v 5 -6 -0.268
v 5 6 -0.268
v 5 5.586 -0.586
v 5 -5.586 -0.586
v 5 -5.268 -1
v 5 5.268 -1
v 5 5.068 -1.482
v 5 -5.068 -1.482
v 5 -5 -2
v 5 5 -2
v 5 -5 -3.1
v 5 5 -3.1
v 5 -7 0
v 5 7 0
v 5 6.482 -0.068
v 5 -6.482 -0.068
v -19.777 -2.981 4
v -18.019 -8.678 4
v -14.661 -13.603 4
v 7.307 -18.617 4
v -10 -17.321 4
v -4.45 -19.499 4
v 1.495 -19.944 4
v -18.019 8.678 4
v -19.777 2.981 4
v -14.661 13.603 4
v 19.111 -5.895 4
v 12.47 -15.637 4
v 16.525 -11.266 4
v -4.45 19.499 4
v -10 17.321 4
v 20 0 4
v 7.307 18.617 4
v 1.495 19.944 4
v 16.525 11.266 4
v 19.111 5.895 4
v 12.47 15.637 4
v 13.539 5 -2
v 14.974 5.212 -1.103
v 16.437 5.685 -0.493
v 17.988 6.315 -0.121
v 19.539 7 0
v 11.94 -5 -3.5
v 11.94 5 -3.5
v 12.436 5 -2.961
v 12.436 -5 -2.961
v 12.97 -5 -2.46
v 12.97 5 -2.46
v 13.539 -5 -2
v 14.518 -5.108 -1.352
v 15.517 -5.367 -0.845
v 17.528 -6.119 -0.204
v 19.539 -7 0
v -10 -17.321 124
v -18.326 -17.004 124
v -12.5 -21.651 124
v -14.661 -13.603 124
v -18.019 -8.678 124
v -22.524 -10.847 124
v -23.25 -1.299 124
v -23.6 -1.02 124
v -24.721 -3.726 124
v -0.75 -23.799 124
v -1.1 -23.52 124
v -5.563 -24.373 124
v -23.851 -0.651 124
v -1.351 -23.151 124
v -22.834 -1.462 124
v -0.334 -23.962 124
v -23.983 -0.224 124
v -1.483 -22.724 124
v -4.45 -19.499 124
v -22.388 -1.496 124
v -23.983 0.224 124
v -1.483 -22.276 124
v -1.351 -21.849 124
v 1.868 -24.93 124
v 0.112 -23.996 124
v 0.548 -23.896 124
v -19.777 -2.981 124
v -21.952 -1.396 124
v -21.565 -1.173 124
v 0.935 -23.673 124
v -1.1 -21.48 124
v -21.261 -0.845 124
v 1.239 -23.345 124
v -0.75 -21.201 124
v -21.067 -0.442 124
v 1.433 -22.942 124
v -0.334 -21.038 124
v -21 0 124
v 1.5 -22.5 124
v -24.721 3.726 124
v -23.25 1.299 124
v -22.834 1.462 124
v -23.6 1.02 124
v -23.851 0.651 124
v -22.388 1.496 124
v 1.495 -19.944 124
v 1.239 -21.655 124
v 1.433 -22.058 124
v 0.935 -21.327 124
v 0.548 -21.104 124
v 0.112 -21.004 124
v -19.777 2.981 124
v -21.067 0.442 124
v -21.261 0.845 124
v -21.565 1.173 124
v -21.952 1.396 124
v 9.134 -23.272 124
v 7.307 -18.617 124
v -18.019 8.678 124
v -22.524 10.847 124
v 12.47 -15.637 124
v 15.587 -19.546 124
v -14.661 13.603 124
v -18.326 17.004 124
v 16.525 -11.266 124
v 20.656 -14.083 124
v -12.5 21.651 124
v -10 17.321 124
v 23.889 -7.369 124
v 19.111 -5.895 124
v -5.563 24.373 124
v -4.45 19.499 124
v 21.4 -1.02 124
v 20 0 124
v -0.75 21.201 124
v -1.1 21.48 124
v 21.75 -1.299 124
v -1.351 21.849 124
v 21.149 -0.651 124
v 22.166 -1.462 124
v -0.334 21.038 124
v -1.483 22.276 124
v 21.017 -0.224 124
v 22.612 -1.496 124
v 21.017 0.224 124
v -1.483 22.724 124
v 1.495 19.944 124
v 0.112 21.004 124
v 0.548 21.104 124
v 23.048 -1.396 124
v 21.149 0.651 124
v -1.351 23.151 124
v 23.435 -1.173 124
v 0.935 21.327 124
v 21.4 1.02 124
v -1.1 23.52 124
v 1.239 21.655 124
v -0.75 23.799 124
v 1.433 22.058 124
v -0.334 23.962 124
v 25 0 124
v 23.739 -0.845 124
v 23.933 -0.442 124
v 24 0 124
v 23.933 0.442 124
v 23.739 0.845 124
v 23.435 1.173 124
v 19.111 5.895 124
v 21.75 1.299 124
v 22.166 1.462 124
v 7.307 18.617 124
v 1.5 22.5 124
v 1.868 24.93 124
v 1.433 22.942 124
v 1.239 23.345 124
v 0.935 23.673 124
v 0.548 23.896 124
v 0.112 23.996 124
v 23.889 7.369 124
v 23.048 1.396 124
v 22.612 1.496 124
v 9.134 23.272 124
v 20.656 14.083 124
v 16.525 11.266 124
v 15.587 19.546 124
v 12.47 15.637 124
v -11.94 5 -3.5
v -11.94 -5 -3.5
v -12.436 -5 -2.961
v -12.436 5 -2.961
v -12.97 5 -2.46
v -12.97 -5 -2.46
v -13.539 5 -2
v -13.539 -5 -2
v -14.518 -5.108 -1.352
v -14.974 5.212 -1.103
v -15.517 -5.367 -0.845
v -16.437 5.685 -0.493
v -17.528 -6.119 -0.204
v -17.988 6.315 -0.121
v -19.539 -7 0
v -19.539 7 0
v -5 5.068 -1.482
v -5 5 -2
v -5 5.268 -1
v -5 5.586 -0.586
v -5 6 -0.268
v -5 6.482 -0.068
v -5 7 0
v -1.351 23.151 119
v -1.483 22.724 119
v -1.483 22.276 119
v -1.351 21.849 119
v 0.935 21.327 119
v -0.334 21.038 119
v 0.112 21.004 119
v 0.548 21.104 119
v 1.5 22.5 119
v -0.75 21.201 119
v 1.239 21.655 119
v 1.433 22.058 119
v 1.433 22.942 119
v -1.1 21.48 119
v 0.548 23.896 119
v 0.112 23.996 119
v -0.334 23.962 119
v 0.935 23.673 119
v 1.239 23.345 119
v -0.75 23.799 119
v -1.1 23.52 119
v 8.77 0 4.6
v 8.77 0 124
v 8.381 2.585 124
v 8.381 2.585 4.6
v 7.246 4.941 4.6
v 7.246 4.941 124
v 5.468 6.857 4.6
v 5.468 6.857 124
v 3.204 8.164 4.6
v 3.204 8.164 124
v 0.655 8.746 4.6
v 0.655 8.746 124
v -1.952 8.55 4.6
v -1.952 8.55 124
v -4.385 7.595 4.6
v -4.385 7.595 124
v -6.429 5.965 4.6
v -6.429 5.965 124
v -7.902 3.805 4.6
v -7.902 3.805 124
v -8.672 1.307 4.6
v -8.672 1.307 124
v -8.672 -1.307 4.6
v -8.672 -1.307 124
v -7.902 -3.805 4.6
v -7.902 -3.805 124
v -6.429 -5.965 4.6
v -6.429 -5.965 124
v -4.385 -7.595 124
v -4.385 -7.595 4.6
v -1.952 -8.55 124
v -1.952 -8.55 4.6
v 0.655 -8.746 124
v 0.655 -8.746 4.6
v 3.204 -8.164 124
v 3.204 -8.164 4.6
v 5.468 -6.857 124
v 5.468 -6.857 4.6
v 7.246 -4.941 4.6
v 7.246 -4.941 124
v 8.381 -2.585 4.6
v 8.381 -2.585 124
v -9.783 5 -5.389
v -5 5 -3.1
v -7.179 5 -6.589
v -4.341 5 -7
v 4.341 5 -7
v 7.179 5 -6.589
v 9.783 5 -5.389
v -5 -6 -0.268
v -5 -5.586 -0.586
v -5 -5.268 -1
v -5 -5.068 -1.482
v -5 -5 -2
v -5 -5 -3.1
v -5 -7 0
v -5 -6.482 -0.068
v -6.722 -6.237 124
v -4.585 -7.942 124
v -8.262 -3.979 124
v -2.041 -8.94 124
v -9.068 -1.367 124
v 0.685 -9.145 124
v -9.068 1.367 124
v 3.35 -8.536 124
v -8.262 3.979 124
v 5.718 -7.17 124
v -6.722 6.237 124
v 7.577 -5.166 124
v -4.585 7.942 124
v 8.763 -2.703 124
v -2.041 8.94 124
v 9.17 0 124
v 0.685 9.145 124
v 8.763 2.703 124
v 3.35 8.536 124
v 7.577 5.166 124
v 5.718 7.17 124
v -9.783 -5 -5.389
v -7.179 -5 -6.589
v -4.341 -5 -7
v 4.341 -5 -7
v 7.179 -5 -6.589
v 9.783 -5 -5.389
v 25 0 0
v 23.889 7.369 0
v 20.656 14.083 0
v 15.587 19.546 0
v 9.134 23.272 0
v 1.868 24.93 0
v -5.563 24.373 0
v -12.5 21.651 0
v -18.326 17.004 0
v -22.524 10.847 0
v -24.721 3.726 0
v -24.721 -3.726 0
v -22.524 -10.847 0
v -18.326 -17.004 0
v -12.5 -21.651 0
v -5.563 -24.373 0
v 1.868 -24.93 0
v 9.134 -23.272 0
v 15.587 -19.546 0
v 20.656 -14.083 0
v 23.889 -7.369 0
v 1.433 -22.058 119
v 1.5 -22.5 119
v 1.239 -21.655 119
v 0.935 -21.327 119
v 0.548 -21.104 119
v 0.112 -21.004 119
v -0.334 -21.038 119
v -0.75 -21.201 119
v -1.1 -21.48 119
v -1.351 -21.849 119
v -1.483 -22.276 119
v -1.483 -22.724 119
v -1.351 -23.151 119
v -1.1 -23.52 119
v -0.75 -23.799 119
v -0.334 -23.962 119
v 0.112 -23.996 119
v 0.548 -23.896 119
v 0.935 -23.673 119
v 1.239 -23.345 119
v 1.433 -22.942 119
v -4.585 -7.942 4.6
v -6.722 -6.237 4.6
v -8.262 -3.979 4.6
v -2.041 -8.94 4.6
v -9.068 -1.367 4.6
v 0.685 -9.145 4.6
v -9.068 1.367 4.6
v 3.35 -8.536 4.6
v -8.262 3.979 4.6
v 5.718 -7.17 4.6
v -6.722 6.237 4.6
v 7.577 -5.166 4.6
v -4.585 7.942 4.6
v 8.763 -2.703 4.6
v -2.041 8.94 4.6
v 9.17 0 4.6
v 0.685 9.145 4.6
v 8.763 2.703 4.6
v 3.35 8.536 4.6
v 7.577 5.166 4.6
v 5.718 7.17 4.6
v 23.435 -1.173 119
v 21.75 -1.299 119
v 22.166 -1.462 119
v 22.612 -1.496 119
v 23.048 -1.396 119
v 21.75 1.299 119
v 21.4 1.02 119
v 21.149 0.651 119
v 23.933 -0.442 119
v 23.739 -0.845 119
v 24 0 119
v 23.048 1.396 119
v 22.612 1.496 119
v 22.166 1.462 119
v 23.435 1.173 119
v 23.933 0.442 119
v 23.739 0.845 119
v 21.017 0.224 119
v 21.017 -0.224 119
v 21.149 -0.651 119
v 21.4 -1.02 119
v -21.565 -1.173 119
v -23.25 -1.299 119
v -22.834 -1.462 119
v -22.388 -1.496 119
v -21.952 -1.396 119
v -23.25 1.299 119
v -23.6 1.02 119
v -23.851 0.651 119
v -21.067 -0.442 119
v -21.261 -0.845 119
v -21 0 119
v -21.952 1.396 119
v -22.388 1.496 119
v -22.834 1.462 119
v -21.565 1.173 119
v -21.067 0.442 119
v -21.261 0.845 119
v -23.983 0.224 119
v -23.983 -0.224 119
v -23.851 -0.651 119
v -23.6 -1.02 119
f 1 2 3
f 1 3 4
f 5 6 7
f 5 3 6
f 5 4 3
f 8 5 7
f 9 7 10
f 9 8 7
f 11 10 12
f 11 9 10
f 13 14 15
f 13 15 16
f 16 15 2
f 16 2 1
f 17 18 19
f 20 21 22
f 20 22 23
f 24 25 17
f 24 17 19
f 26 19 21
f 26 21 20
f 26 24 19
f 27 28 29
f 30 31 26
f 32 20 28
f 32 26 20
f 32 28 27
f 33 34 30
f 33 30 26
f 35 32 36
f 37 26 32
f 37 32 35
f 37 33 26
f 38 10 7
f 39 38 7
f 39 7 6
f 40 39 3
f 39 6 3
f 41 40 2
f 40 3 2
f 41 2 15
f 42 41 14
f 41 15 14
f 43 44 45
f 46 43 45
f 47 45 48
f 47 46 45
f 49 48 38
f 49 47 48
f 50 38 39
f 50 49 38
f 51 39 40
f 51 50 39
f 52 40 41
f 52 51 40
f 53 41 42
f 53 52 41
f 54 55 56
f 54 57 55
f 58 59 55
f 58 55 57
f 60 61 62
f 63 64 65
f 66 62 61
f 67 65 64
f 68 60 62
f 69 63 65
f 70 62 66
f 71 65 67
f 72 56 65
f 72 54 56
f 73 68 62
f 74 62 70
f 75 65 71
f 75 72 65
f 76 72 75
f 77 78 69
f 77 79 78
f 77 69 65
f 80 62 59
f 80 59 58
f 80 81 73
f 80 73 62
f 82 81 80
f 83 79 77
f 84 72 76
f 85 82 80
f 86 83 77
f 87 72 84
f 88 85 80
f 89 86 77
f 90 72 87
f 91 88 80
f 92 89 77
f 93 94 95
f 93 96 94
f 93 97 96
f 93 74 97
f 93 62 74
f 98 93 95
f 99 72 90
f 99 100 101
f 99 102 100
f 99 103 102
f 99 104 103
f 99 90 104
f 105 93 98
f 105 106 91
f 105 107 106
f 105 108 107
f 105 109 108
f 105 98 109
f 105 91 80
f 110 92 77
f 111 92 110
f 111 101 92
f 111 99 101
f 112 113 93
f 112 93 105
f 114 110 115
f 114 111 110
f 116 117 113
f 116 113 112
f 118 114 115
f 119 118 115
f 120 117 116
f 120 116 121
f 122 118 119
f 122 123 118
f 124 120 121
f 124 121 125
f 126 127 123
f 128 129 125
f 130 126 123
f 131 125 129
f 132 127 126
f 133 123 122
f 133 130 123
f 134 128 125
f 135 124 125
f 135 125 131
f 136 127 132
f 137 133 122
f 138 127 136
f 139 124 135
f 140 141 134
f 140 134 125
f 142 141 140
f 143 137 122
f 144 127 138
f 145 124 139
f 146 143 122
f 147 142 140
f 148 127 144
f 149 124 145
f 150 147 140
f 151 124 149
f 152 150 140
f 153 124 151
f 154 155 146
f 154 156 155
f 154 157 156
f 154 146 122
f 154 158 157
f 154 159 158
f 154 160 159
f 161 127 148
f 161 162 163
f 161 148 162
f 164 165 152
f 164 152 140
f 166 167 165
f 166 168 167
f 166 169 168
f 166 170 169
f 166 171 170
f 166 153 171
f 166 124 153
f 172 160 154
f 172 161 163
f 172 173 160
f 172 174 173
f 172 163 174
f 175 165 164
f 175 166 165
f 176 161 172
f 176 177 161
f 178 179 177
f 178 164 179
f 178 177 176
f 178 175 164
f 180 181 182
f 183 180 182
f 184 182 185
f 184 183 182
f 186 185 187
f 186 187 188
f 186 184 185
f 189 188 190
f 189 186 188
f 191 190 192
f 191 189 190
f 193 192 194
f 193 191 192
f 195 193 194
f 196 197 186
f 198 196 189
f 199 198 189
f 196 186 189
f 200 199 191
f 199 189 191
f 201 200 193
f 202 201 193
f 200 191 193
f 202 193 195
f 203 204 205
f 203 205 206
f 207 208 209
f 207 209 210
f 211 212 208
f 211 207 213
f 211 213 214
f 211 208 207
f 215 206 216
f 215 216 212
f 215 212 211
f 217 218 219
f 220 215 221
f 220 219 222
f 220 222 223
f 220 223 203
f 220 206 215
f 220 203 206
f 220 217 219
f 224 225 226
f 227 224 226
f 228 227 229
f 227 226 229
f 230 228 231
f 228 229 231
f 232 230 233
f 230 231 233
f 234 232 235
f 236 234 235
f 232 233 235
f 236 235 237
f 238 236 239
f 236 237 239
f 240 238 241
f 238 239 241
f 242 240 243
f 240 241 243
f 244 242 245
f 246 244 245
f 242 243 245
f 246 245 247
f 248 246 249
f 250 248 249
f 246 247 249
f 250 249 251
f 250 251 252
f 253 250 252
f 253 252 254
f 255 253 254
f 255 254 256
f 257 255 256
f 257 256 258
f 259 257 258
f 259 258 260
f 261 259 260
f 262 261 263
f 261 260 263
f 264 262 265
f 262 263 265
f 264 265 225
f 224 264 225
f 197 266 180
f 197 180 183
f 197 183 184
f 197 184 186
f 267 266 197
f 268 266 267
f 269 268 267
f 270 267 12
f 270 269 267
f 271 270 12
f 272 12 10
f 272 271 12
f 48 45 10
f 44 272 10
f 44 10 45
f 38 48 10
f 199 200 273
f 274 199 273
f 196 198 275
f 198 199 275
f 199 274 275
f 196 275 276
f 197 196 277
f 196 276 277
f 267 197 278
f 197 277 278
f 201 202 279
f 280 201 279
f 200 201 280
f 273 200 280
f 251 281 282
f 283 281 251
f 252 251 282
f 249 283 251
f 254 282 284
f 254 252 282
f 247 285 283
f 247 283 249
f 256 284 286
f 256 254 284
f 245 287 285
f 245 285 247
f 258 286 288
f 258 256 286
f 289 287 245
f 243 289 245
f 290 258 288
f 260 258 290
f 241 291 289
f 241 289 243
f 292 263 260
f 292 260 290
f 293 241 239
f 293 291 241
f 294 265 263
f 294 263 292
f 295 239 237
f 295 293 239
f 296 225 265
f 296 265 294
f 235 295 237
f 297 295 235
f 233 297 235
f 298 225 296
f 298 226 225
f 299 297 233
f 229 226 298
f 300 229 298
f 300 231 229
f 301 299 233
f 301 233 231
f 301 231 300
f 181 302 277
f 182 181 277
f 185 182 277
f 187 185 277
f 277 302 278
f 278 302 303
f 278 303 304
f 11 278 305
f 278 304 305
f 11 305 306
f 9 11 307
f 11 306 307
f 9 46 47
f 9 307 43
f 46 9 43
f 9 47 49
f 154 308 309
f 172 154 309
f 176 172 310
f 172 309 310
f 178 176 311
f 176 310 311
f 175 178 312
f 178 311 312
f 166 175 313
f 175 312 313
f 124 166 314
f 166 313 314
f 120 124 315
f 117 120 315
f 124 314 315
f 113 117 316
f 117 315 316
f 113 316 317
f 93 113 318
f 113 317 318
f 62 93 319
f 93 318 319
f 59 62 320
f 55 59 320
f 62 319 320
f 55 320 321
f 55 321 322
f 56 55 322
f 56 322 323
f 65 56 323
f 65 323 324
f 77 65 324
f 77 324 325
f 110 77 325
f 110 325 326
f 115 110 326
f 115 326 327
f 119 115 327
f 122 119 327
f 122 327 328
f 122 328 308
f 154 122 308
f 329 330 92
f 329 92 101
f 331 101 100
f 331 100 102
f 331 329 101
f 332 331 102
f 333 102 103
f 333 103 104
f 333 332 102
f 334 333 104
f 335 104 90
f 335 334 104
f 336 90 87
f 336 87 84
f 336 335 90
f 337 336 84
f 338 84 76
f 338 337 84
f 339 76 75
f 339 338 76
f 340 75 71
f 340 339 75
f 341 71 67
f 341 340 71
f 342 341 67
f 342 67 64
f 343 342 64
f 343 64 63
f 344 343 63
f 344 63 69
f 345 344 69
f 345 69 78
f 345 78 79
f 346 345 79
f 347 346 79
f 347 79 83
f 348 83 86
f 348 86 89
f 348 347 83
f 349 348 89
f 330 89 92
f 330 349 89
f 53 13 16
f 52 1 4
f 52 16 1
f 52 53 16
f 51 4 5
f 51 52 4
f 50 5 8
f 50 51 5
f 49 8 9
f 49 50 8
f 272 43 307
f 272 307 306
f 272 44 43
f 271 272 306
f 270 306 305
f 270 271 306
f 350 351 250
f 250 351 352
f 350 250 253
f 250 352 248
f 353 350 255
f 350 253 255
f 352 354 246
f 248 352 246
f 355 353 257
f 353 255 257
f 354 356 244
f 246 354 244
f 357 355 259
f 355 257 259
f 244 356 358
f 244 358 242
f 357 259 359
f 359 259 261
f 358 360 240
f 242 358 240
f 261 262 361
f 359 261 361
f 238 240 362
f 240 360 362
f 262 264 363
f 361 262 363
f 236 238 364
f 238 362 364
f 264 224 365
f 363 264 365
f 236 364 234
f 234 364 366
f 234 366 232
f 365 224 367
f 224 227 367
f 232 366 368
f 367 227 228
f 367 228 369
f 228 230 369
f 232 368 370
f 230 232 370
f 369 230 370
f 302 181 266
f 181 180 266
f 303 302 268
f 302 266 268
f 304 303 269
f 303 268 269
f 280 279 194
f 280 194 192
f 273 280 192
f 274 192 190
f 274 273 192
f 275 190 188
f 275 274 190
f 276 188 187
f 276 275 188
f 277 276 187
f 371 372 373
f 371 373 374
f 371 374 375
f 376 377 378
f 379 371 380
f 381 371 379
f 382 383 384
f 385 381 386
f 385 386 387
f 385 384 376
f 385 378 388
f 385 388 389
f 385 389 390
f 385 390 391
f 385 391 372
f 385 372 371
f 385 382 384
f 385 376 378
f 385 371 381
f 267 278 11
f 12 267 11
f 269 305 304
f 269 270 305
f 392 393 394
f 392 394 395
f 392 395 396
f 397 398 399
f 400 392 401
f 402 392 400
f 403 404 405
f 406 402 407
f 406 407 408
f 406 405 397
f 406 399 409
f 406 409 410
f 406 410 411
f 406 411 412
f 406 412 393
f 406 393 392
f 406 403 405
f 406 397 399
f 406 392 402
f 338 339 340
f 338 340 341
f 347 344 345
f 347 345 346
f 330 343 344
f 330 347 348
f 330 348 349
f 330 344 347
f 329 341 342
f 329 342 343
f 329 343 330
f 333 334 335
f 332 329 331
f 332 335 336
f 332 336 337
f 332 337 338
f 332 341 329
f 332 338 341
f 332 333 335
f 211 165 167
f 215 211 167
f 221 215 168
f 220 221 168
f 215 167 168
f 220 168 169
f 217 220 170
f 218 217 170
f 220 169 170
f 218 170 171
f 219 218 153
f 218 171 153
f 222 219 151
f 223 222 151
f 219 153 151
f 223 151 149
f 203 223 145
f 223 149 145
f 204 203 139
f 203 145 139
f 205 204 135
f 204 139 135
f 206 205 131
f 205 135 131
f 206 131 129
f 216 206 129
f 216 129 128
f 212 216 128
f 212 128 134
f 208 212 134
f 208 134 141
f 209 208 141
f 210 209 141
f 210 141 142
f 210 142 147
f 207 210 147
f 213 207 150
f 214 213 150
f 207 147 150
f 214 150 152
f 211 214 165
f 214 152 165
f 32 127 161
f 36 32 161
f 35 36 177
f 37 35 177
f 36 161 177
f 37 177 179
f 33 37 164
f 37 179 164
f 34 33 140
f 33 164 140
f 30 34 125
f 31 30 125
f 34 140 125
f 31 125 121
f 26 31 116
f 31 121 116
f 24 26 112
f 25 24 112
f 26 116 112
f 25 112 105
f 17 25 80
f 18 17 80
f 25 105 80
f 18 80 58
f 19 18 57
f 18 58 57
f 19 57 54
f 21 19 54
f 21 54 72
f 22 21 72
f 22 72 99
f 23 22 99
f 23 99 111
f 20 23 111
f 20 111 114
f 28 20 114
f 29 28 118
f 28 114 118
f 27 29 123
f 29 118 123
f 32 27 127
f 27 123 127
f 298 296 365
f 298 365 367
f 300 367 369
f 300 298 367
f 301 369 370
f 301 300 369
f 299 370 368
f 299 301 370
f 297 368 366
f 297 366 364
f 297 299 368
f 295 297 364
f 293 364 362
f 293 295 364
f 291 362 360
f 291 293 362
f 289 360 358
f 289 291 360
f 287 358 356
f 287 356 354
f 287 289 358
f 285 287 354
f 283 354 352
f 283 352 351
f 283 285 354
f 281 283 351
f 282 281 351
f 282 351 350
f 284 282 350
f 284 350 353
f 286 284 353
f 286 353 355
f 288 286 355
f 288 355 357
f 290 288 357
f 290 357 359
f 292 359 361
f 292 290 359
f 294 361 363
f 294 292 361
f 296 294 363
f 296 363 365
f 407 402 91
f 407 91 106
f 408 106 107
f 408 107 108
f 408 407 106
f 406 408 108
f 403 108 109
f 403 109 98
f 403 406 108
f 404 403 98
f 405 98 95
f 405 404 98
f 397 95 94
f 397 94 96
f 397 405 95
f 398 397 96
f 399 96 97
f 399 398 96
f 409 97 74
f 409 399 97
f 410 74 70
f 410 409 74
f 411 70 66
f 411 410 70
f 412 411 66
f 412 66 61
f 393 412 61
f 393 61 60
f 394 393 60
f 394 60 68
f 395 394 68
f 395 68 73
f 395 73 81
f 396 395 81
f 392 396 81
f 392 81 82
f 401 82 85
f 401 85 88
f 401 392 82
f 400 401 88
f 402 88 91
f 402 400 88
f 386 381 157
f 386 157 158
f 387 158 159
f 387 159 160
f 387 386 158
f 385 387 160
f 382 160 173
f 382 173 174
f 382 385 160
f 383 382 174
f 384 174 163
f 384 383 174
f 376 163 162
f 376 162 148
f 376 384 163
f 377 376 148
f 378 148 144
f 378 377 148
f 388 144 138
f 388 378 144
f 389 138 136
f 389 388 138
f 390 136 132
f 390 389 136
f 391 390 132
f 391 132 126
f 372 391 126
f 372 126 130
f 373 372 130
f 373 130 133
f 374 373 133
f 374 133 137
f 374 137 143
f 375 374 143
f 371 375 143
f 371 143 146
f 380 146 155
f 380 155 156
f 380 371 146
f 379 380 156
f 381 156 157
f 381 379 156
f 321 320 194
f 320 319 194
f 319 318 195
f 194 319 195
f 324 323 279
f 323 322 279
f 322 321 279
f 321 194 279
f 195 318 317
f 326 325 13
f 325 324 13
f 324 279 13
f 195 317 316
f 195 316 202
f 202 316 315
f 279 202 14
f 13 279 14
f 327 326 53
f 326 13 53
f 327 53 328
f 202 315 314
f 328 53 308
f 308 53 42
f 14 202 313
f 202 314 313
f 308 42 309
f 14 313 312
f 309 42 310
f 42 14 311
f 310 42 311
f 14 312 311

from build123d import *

# Parameters (mm, degrees)
SKETCH1_R               = 25
BOSS_EXTRUDE2_DEPTH     = 124
SKETCH3_R               = 20
CUT_EXTRUDE1_DEPTH      = 120
SKETCH4_W               = 20
SKETCH4_H               = 10
BOSS_EXTRUDE3_DEPTH     = 7
FILLET1_R               = 10
FILLET2_R               = 10
FILLET3_R               = 2
CUT_EXTRUDE2_DEPTH      = 131.003846097
CUT_EXTRUDE2_DEPTH_BACK = 131.003846097
SKETCH5_W               = 10
SKETCH5_H               = 3.1
SKETCH6_R               = 1.5
CUT_EXTRUDE3_DEPTH      = 5
CIRPATTERN1_START       = 119
CIRPATTERN1_OUTLINE_R   = 1.5
CIRPATTERN1_DEPTH       = 5
SKETCH8_R               = 9.170359624
SKETCH8_R_2             = 8.770359624
BOSS_EXTRUDE4_DEPTH     = 119.4


# Read off the part's stored shape, not the designer's step: CirPattern1
with BuildPart() as part:
    # Sketch1 → Boss-Extrude2 (new body)
    with BuildSketch(Plane.XY):
        Circle(SKETCH1_R)
    extrude(amount=BOSS_EXTRUDE2_DEPTH)

    # Sketch3 → Cut-Extrude1 (cut)
    with BuildSketch(Plane.XY.offset(124)):
        Circle(SKETCH3_R)
    extrude(amount=-CUT_EXTRUDE1_DEPTH, mode=Mode.SUBTRACT)

    # Sketch4 → Boss-Extrude3 (add)
    with BuildSketch(Plane(origin=(0, 0, 0), x_dir=(-1, 0, 0), z_dir=(0, 0, -1))):
        Rectangle(SKETCH4_W, SKETCH4_H)
    extrude(amount=BOSS_EXTRUDE3_DEPTH)

    # Fillet1
    # the kernel refuses this fillet: 10 mm, written as the material it adds along each edge
    with BuildSketch(Plane(origin=(-10, 5, 0), x_dir=(-1, 0, 0), z_dir=(0, -1, 0)), Plane(origin=(10, -5, 0), x_dir=(1, 0, 0), z_dir=(0, 1, 0))) as fillet1_piece_1:
        with BuildLine():
            CenterArc((9.539392014, 10), FILLET1_R, 197.457603124, 72.542396876)
            Line((0, 7), (-0.19078784, 6.94))
            ThreePointArc((-0.19078784, 6.94), (-0.2, 3.5), (-0.2, 0))
            Line((-0.2, 0), (0, -0.2))
            Line((0, -0.2), (9.539392014, -0.2))
            Line((9.539392014, -0.2), (9.539392014, 0))
        make_face()
    extrude(amount=10)

    # Fillet2
    fillet2_edges = [part.edges().sort_by_distance(p)[0] for p in [
        (-10, 0, -7),
        (10, 0, -7),
    ]]
    fillet(fillet2_edges, radius=FILLET2_R)

    # Fillet3
    fillet3_edges = [part.edges().sort_by_distance(p)[0] for p in [
        (0, 5, 0),
        (0, -5, 0),
    ]]
    fillet(fillet3_edges, radius=FILLET3_R)

    # Sketch5 → Cut-Extrude2 (cut, two sides: drawn at the far end of the back side and taken through both)
    with BuildSketch(Plane(origin=(0, 5, 0), x_dir=(1, 0, 0), z_dir=(0, 1, 0)).offset(-CUT_EXTRUDE2_DEPTH_BACK)):
        with Locations((0, 1.55)):
            Rectangle(SKETCH5_W, SKETCH5_H)
    extrude(amount=CUT_EXTRUDE2_DEPTH + CUT_EXTRUDE2_DEPTH_BACK, mode=Mode.SUBTRACT)

    # Sketch6 → Cut-Extrude3 (cut)
    with BuildSketch(Plane.XY.offset(124)):
        with Locations((0, 22.5)):
            Circle(SKETCH6_R)
    extrude(amount=-CUT_EXTRUDE3_DEPTH, mode=Mode.SUBTRACT)

    # CirPattern1 outline → CirPattern1 (cut)
    with BuildSketch(Plane.XY.offset(CIRPATTERN1_START)):
        with Locations((-22.5, 0)):
            Circle(CIRPATTERN1_OUTLINE_R)
        with Locations((0, -22.5)):
            Circle(CIRPATTERN1_OUTLINE_R)
        with Locations((22.5, 0)):
            Circle(CIRPATTERN1_OUTLINE_R)
    extrude(amount=CIRPATTERN1_DEPTH, mode=Mode.SUBTRACT)


with BuildPart() as body_2:
    # Sketch8 → Boss-Extrude4 (new body)
    with BuildSketch(Plane.XY.offset(124)):
        Circle(SKETCH8_R)
        Circle(SKETCH8_R_2, mode=Mode.SUBTRACT)
    extrude(amount=-BOSS_EXTRUDE4_DEPTH)


solid = Compound([part.part, body_2.part])
